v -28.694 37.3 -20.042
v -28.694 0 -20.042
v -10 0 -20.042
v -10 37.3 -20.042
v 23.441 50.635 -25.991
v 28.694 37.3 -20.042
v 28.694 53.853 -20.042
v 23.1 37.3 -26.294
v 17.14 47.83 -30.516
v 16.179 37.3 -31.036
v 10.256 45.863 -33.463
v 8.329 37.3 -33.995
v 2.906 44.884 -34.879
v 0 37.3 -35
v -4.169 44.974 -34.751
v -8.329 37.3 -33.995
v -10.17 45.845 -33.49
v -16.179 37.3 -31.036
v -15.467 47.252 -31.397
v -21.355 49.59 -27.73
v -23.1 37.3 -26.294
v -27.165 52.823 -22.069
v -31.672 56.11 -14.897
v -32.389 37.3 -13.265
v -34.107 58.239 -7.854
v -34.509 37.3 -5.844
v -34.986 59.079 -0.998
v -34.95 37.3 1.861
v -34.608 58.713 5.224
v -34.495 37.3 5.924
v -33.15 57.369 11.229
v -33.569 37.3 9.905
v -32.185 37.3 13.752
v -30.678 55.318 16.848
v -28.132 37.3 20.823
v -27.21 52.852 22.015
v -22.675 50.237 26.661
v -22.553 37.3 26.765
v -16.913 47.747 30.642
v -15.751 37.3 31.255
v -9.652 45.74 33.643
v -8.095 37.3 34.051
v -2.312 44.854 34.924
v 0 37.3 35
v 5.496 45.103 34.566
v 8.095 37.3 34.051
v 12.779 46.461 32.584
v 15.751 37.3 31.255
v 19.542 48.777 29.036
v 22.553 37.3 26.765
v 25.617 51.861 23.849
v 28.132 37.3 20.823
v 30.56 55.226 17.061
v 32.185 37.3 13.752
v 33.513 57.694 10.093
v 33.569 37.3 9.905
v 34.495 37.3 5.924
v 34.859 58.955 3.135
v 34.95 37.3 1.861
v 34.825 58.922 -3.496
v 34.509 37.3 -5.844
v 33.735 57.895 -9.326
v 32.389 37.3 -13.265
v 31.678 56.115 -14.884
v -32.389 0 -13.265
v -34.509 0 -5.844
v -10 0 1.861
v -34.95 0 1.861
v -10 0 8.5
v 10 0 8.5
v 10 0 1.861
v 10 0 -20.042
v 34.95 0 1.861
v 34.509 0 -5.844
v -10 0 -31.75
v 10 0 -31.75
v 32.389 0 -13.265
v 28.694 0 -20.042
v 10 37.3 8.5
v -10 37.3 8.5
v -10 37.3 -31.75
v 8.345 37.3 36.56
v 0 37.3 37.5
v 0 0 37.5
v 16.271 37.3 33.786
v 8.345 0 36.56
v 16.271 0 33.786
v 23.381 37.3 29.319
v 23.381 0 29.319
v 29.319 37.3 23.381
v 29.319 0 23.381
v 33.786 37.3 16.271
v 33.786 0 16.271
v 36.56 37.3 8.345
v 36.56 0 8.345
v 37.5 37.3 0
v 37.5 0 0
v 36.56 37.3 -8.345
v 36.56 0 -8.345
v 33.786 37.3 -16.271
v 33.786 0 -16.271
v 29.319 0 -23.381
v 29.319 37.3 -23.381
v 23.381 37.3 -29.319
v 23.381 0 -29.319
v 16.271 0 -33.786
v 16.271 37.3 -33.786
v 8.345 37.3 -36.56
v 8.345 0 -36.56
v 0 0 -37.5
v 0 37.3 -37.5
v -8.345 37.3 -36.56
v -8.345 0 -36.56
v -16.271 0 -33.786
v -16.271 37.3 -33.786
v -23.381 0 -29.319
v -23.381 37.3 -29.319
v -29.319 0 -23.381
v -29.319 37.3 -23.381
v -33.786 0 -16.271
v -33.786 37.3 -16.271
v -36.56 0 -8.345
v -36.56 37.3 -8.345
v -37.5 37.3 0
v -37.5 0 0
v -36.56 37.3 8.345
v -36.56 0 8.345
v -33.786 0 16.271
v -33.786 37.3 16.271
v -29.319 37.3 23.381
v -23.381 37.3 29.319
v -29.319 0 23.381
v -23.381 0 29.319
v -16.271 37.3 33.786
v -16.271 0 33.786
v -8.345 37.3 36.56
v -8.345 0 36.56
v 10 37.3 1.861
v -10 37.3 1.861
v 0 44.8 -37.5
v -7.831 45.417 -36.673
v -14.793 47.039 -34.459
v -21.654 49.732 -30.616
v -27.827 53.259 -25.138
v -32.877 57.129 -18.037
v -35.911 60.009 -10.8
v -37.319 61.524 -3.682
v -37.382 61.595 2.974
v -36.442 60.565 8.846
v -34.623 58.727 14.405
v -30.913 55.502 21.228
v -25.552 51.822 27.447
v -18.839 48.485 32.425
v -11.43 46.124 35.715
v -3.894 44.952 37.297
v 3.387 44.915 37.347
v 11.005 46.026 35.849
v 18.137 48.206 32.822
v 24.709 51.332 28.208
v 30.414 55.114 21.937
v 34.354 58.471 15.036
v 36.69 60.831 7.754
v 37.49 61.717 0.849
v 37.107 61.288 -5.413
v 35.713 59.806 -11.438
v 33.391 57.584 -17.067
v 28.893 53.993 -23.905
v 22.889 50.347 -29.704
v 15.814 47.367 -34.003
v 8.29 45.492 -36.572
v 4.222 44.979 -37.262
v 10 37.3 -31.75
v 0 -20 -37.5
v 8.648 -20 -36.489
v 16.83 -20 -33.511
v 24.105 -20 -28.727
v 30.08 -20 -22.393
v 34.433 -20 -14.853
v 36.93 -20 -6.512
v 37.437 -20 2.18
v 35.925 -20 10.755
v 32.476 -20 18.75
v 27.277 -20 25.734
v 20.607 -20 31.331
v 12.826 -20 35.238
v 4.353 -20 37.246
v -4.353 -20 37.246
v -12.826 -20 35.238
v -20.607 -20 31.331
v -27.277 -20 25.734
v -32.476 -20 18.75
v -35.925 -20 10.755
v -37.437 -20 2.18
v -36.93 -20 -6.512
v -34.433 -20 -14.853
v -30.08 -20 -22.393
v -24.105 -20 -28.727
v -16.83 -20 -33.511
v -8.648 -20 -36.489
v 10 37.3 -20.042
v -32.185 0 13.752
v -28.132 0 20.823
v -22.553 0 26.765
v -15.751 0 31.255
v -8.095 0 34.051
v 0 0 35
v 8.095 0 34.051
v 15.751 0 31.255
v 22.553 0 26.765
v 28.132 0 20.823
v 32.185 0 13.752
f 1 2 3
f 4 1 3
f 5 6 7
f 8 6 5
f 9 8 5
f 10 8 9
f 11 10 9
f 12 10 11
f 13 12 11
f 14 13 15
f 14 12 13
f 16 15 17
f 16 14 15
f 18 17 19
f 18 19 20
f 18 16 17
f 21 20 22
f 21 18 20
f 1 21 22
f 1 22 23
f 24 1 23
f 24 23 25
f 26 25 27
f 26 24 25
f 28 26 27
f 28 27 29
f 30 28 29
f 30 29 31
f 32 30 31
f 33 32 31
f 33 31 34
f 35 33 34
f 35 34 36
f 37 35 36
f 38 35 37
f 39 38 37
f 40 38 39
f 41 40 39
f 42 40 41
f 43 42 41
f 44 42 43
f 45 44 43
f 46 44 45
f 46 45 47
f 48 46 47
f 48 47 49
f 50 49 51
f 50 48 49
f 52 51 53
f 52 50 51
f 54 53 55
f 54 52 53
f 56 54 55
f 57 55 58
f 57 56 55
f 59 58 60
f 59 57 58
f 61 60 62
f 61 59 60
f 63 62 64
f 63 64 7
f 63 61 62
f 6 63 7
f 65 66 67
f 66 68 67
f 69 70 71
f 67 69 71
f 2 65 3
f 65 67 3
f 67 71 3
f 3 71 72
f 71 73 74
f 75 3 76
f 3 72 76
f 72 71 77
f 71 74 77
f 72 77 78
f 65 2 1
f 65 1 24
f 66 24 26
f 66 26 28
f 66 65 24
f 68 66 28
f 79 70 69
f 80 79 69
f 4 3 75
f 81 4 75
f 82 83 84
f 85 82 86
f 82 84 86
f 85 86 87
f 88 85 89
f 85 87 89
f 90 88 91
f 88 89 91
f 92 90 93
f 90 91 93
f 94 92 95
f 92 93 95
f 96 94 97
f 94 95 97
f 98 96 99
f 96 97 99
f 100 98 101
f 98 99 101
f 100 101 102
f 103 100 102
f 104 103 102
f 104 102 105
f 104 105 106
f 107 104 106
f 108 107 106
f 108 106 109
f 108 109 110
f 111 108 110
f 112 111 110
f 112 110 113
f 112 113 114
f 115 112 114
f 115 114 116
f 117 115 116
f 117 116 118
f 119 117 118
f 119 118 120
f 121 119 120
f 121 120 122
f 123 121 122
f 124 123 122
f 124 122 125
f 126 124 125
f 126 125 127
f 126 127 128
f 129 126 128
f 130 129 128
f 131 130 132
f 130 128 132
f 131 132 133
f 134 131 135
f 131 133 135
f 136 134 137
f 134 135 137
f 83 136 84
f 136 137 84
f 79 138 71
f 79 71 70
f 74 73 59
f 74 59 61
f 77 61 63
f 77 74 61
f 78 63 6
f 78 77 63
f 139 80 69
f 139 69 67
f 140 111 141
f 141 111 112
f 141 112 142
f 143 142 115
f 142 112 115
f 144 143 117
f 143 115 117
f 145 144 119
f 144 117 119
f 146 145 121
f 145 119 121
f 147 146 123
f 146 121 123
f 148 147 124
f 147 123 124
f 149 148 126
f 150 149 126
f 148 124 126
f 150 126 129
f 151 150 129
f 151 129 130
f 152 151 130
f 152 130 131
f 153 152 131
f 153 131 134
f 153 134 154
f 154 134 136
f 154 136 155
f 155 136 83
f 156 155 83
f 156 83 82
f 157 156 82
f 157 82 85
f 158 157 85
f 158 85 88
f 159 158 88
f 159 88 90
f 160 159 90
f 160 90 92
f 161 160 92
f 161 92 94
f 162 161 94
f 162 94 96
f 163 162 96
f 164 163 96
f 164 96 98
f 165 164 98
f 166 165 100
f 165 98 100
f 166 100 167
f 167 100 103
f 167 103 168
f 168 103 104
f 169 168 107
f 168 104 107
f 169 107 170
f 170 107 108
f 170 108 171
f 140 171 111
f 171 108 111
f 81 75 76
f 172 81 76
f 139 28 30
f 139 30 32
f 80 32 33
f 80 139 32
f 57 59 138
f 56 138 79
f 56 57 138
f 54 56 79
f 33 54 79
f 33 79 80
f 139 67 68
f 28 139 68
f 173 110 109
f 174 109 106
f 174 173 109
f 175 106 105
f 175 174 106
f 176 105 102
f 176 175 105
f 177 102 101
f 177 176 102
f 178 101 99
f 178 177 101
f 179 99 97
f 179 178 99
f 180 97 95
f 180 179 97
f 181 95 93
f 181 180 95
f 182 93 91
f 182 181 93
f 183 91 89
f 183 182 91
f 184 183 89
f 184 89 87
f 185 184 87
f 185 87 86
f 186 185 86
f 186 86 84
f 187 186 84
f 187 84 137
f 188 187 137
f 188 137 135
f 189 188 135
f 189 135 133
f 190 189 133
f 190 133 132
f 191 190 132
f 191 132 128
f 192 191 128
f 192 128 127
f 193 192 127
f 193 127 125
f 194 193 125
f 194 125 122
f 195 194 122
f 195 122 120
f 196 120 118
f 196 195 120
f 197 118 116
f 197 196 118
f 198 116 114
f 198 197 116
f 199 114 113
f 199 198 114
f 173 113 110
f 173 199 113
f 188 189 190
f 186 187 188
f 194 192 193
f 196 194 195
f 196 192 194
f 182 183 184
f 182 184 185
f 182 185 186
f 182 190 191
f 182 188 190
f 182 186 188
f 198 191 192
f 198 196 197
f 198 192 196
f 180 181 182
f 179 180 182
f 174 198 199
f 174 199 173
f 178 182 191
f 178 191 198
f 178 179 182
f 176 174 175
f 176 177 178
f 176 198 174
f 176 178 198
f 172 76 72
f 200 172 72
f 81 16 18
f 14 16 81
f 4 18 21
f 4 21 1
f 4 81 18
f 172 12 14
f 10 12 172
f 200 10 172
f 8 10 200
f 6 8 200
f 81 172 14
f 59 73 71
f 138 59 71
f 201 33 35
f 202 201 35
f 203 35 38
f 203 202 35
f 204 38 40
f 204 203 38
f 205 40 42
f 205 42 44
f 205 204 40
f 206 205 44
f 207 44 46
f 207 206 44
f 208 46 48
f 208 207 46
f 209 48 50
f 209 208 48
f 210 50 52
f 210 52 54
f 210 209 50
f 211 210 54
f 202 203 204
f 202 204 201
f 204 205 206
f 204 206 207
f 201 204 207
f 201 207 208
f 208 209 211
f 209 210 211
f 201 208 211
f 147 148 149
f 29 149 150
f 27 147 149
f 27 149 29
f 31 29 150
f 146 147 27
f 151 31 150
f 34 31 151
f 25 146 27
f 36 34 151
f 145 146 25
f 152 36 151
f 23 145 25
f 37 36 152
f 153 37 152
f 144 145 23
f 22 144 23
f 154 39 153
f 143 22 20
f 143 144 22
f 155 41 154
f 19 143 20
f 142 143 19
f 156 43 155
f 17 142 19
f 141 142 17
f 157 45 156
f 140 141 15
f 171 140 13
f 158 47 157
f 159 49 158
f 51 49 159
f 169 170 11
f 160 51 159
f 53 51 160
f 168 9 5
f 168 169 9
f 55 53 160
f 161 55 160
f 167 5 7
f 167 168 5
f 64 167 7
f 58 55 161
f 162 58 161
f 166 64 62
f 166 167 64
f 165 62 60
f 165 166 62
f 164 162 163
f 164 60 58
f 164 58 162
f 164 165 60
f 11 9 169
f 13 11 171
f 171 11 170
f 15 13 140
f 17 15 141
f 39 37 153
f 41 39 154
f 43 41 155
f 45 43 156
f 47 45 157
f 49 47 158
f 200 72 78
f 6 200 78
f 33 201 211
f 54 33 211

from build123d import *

# Parameters (mm, degrees)
SKETCH2_R               = 37.5
SKETCH2_R_2             = 35
BOSS_EXTRUDE2_DEPTH     = 37.3
BOSS_EXTRUDE3_START     = 20
SKETCH3_R               = 37.5
BOSS_EXTRUDE3_DEPTH     = 20
SKETCH4_R               = 37.5
SKETCH4_R_2             = 35
BOSS_EXTRUDE4_DEPTH     = 40
CUT_EXTRUDE2_DEPTH      = 60
CUT_EXTRUDE2_DEPTH_BACK = 60
SKETCH5_R               = 50


with BuildPart() as part:
    # Sketch2 → Boss-Extrude2 (new body)
    # profile 1 of 3: a face of its own
    with BuildSketch(Plane(origin=(0, 0, 0), x_dir=(1, 0, 0), z_dir=(0, 1, 0))):
        with Locations(Location((0, 0, 0), (0, 0, 270))):
            Circle(SKETCH2_R)
        Circle(SKETCH2_R_2, mode=Mode.SUBTRACT)
    # profile 2 of 3: a face of its own
    with BuildSketch(Plane(origin=(0, 0, 0), x_dir=(1, 0, 0), z_dir=(0, 1, 0))):
        with BuildLine():
            ThreePointArc((28.693735847, 20.041694617), (0, 35), (-28.693735847, 20.041694617))
            Line((-28.693735847, 20.041694617), (-10, 20.041694617))
            Line((-10, 20.041694617), (-10, 31.75))
            Line((-10, 31.75), (10, 31.75))
            Line((10, 31.75), (10, 20.041694617))
            Line((10, 20.041694617), (28.693735847, 20.041694617))
        make_face()
    # profile 3 of 3: a face of its own
    with BuildSketch(Plane(origin=(0, 0, 0), x_dir=(1, 0, 0), z_dir=(0, 1, 0))):
        with BuildLine():
            Line((-10, -1.861454278), (-34.950464775, -1.861454278))
            ThreePointArc((-34.950464775, -1.861454278), (-34.090270263, -7.928018251), (-32.18529571, -13.751608636))
            Line((-32.18529571, -13.751608636), (32.18529571, -13.751608636))
            ThreePointArc((32.18529571, -13.751608636), (34.090270263, -7.928018251), (34.950464775, -1.861454278))
            Line((34.950464775, -1.861454278), (10, -1.861454278))
            Line((10, -1.861454278), (10, -8.5))
            Line((10, -8.5), (-10, -8.5))
            Line((-10, -8.5), (-10, -1.861454278))
        make_face()
    extrude(amount=BOSS_EXTRUDE2_DEPTH)

    # Sketch3 → Boss-Extrude3 (add)
    with BuildSketch(Plane.XZ.offset(BOSS_EXTRUDE3_START)):
        with Locations(Location((0, 0, 0), (0, 0, 270))):
            Circle(SKETCH3_R)
    extrude(amount=-BOSS_EXTRUDE3_DEPTH)

    # Sketch4 → Boss-Extrude4 (add)
    with BuildSketch(Plane(origin=(0, 37.3, 0), x_dir=(1, 0, 0), z_dir=(0, 1, 0))):
        with Locations(Location((0, 0, 0), (0, 0, 90))):
            Circle(SKETCH4_R)
        with Locations(Location((0, 0, 0), (0, 0, 34.933118398))):
            Circle(SKETCH4_R_2, mode=Mode.SUBTRACT)
    extrude(amount=BOSS_EXTRUDE4_DEPTH)

    # Sketch5 → Cut-Extrude2 (cut, two sides: drawn at the far end of the back side and taken through both)
    with BuildSketch(Plane.XY.offset(-CUT_EXTRUDE2_DEPTH_BACK)):
        with Locations((0, 94.8)):
            Circle(SKETCH5_R)
    extrude(amount=CUT_EXTRUDE2_DEPTH + CUT_EXTRUDE2_DEPTH_BACK, mode=Mode.SUBTRACT)


solid = part.part
